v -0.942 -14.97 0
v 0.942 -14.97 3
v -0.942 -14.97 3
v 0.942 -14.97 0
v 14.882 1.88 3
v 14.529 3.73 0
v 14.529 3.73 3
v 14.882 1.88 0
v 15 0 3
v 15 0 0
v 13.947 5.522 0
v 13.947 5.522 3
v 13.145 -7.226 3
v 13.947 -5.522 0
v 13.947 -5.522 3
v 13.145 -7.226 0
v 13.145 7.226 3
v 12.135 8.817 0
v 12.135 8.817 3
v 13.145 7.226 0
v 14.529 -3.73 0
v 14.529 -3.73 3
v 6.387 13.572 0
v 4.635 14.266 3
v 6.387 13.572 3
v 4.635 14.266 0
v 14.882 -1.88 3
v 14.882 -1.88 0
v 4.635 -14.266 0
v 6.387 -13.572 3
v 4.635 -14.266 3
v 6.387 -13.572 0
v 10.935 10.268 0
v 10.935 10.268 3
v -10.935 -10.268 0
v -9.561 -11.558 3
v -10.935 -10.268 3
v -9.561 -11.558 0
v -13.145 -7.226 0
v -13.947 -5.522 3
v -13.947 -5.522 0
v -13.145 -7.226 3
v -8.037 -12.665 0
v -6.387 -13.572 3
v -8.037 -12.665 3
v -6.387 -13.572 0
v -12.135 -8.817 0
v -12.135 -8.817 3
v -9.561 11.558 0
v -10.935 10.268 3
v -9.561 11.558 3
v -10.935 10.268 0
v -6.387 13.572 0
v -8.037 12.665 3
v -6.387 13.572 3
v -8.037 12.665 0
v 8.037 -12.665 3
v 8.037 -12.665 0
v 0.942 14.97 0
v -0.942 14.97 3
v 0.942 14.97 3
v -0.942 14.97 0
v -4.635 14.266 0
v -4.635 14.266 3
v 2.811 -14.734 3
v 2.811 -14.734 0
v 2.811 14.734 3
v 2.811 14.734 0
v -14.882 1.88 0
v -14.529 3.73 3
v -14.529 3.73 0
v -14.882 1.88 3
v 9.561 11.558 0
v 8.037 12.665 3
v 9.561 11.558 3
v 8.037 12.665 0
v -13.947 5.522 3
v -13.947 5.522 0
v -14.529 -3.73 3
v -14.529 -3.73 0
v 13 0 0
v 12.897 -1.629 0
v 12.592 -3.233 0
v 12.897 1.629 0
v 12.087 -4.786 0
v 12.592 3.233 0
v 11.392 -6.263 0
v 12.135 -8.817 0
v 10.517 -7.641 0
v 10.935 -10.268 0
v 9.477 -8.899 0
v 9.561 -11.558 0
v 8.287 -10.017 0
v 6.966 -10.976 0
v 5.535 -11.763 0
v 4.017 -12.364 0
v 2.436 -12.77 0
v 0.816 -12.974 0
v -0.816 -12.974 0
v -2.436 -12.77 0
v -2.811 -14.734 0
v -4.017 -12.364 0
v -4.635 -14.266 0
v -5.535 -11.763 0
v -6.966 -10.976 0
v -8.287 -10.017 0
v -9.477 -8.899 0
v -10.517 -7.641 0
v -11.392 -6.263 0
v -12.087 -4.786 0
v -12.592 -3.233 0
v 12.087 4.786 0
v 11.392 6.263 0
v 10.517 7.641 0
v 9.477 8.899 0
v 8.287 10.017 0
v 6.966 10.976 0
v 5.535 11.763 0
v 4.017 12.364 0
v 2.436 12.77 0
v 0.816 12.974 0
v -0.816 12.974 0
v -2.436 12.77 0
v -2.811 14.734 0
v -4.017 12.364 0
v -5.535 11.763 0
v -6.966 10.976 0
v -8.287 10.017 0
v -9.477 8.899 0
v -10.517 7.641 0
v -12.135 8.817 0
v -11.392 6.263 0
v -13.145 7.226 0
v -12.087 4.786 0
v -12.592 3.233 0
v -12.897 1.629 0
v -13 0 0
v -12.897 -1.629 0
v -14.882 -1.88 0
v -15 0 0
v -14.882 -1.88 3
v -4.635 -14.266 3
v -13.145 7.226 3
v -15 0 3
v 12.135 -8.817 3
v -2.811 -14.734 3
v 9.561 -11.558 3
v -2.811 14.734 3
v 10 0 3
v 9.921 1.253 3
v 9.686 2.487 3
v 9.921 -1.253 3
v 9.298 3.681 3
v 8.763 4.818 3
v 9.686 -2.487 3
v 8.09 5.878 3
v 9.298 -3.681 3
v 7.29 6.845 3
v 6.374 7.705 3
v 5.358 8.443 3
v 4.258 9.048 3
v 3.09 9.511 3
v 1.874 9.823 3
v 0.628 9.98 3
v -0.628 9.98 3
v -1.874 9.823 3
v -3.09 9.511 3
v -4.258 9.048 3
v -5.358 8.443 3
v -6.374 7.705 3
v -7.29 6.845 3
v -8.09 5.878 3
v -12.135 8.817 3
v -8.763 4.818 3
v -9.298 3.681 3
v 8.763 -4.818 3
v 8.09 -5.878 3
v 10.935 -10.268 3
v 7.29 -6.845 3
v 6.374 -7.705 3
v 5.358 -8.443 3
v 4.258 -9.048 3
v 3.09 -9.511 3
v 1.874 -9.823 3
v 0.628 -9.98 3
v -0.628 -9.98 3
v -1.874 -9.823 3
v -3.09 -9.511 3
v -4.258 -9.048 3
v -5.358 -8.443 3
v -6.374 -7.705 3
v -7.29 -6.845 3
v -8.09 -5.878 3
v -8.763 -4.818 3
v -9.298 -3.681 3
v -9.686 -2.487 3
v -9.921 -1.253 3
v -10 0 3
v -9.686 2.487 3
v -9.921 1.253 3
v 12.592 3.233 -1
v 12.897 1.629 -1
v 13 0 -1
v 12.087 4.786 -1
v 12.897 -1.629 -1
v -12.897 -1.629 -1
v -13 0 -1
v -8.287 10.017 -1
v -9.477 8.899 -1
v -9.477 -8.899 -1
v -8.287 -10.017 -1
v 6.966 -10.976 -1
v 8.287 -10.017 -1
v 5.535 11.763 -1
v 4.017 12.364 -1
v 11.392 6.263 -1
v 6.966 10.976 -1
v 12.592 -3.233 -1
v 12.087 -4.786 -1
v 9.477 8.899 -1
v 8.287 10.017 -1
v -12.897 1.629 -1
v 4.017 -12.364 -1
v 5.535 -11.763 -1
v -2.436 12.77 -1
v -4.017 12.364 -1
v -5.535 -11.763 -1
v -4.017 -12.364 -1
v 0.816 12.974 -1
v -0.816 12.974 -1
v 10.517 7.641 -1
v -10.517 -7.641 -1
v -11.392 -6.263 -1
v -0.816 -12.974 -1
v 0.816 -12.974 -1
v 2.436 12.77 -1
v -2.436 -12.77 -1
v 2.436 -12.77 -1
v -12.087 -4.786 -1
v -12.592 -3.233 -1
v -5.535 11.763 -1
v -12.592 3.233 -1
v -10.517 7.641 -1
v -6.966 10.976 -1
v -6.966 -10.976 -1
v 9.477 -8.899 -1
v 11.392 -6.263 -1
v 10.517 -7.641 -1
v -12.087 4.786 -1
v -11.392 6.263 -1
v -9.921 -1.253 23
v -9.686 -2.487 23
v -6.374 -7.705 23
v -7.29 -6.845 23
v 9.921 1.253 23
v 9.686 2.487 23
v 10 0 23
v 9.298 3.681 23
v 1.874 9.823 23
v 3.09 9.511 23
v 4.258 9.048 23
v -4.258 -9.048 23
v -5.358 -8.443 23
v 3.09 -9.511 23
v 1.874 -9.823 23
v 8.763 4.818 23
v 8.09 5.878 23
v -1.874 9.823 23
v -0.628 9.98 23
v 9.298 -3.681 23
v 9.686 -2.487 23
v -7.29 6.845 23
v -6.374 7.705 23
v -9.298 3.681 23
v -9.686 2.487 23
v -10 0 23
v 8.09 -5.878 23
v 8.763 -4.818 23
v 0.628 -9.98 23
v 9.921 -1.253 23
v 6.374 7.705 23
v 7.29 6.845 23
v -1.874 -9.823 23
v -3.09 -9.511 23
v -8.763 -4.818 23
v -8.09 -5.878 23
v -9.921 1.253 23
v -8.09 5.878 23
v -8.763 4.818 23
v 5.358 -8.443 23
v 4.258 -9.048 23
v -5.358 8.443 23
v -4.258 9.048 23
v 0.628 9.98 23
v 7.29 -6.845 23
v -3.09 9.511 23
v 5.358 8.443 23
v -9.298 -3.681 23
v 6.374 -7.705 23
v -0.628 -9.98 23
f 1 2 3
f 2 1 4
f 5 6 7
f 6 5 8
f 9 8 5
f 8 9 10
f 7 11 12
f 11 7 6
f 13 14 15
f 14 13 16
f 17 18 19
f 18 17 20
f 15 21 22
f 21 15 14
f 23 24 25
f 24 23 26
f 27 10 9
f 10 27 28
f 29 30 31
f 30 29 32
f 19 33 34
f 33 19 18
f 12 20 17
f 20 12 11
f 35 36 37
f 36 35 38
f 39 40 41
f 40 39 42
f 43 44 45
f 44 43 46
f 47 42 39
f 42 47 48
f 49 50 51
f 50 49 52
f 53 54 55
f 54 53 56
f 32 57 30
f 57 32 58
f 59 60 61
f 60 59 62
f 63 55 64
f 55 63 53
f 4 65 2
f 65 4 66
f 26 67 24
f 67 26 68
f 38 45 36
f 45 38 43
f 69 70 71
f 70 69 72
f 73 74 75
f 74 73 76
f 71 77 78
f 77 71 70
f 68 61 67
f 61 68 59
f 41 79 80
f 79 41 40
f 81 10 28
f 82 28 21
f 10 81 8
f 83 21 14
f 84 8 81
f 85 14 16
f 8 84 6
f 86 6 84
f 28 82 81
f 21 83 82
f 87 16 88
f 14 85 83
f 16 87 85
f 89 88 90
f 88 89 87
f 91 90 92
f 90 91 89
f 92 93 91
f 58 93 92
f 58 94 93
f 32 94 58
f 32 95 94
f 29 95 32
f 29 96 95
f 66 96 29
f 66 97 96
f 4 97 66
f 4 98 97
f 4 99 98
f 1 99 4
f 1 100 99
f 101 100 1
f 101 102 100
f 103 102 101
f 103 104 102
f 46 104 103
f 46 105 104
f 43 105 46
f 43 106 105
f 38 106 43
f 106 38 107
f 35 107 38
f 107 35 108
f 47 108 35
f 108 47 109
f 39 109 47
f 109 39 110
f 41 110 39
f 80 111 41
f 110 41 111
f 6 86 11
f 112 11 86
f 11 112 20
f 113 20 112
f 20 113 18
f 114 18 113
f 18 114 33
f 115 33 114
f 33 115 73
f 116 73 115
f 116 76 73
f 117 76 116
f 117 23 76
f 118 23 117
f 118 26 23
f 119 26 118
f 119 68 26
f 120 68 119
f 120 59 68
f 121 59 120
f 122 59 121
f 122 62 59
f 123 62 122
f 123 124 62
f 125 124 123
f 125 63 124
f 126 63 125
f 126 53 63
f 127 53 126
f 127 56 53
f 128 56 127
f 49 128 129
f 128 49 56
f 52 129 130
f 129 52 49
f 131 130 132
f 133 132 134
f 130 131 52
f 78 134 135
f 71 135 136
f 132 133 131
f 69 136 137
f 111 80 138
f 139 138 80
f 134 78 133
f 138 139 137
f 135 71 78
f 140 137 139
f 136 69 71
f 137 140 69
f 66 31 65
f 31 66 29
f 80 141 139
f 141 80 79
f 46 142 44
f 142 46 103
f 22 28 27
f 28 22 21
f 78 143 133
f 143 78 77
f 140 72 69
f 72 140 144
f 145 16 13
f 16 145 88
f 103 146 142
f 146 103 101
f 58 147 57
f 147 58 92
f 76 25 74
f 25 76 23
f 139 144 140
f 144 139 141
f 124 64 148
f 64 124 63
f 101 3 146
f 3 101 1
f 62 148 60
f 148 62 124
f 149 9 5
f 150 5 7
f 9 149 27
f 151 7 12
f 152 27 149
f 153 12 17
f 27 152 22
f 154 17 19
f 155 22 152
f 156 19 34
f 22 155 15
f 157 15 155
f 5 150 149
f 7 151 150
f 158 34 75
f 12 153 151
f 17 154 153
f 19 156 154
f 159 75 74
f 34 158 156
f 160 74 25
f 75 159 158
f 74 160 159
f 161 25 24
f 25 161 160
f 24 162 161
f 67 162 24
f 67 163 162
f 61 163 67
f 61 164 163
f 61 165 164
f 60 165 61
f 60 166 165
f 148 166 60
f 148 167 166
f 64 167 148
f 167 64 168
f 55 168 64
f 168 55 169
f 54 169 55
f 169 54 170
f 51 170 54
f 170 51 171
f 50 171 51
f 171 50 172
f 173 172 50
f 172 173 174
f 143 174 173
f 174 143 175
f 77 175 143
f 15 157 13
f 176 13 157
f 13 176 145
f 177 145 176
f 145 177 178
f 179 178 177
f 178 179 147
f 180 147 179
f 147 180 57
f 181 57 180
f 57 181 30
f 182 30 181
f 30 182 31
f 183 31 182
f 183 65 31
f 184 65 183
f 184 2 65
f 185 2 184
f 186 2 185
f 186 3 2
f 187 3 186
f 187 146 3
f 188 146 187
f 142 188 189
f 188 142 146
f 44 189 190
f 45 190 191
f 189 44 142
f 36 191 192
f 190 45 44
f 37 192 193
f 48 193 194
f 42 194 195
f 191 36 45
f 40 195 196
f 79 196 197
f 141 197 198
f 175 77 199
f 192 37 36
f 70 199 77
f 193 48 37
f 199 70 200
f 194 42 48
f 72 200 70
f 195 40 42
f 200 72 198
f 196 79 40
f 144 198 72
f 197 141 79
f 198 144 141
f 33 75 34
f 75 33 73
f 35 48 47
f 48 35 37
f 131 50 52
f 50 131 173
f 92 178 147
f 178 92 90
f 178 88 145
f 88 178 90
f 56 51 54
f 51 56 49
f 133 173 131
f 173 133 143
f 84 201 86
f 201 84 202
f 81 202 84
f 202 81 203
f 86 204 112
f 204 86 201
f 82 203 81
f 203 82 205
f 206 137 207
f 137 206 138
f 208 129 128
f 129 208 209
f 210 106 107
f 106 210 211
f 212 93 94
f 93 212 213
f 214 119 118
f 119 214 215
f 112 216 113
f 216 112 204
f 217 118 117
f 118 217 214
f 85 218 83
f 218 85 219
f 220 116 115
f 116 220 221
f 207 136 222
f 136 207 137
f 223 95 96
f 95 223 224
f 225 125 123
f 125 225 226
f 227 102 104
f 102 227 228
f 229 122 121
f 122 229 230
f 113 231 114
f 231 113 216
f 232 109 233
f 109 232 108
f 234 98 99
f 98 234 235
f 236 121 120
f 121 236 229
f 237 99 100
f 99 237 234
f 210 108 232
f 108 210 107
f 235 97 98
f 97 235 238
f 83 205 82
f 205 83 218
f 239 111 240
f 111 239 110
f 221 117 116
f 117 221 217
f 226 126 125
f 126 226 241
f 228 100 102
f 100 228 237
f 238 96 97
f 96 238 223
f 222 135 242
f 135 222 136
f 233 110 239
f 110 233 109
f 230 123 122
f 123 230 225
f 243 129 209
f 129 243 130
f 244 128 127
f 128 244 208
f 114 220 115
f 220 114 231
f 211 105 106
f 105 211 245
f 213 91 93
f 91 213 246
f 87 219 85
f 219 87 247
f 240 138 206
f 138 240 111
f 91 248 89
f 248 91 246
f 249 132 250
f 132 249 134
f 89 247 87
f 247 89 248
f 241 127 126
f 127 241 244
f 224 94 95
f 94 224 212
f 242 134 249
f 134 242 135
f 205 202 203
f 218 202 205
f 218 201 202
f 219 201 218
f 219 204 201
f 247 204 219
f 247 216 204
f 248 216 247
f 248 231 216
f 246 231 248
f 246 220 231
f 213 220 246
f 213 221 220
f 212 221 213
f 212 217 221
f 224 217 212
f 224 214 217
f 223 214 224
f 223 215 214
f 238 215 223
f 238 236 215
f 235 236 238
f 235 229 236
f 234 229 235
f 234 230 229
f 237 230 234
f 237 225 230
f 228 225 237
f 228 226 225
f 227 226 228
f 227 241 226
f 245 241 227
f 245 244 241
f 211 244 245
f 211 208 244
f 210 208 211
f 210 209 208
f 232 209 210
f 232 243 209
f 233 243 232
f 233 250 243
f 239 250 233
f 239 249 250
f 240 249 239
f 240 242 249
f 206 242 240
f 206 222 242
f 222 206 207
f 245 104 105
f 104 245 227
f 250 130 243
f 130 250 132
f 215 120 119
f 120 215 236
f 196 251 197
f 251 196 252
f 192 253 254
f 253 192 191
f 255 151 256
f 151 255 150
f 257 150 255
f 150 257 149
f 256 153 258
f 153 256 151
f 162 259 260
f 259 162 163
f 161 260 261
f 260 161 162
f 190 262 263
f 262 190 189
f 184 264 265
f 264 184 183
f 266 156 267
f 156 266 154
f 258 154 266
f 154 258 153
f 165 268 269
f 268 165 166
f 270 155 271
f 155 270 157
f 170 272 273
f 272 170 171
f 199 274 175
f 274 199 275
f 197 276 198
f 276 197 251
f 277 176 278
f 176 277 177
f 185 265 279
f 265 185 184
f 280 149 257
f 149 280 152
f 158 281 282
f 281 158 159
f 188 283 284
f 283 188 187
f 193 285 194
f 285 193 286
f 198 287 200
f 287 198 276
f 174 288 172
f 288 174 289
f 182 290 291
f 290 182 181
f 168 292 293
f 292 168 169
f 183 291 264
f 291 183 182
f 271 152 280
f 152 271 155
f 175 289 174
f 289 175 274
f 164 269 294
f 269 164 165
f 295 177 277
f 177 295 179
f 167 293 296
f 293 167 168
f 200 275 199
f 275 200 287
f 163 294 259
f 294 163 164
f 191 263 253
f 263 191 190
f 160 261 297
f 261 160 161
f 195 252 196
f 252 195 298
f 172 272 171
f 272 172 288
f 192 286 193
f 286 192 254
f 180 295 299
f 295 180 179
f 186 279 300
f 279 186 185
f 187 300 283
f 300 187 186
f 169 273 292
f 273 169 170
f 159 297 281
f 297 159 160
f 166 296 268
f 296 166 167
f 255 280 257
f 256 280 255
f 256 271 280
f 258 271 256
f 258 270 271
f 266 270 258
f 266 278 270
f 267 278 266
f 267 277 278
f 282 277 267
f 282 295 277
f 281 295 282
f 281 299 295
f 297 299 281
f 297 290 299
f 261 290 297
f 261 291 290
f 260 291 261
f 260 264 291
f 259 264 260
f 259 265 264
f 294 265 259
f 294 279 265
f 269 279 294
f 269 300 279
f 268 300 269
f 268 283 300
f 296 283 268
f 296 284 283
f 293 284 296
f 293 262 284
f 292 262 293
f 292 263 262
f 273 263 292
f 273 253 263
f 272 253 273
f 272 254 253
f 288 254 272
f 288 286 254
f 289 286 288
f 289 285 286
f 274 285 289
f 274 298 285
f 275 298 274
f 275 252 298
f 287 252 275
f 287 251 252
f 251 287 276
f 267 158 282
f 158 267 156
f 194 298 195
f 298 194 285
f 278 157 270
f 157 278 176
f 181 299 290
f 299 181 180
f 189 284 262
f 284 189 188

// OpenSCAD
// file: parametre.scad
/* pour le rendu openscad */

// pour la finesse de rendu
// plus c'est élevé, mieux c'est... mais ça prend plus de temps et de ressource
resolution = 50;

// pour enlever de la matière des objets dans openscad et être certain qu'il ne reste pas un bout de face
difference_objet_marge = 20;

// pour afficher (1) ou pas (0) les accessoires installés
show_accessoires = 1;



/* pour le design du jeu  */

// tout est en millimetre !!!!

// configuration globale
////////////////////////

// quand on perce et que l'on va insérer quelque chose dedans...
// il faut un peu de vide en plus ;)
padding_percage = 0.2;

// espace supplémentaire pour la largeur de rainure
padding_rainure = 1;

// profondeur standard pour une rainure
profondeur_rainure = 2; // moins que epaisseur_tole_grille_led et que epaisseur_tole_grille_led ! Il faut qu'il reste de la matière !

// définition de base du jeu
nombre_colonnes = 7;
nombre_lignes = 6;


// les boutons de sélection de colonne et du nombre de joueurs
//////////////////////////////////////////////////////////////
diametre_bouton_arcade = 30;
rayon_bouton_arcade = diametre_bouton_arcade / 2;
diametre_trou_bouton_arcade = 20; // TODO: à valider !
rayon_trou_bouton_arcade = diametre_trou_bouton_arcade / 2;
hauteur_bague_bouton_arcade = 3;
hauteur_bouton_arcade = 1;
diametre_push_bouton_arcade = diametre_bouton_arcade - 4;
profondeur_interne_bouton_arcade = 20; // TODO: à valider !


// bouton EC11
//////////////
diametre_bouton_ec11 = 14.4;
hauteur_bouton_ec11 = 13.1;
epaisseur_trait_ec11 = 1;
trou_axe_ec11 = 7;
espace_platine_bouton = 10.7;
hauteur_platine_ec11 = 33.4;
largeur_platine_ec11 = 27.5;
epaisseur_platine_ec11 = 1.3;
trou_fixation_ec11 = 3;
trou_marge_ec11 = 2.40;


// haut-parleur HP8R
////////////////////
HP8R_epaisseur_totale = 16.25;
HP8R_largeur = 36.24;
HP8R_hauteur = 75;
HP8R_epaisseur_tole = 1.63;
HP8R_hauteur_caisson = 71;
//HP8R_epaisseur_caisson = 16.25 - HP8R_epaisseur_tole;
HP8R_decalage_hauteur_trou = 12.3;
HP8R_largeur_trou = 27.1;
HP8R_hauteur_trou = 38.3;
HP8R_epaisseur_trou = HP8R_epaisseur_totale - 2;
HP8R_diametre_creuse_coins = 10;
HP8R_diametre_creuse_fixation = 3;
HP8R_marge_creuse_fixation = 1.6 + padding_percage;


// Embase alimentation
//////////////////////
embase_decallage = 3.3;
embase_externe_largeur = 8.95;
embase_externe_hauteur = 10.7;
embase_externe_profondeur = 3.5;
embase_externe_marge_trou = 3.3;
embase_externe_diametre_trou = 6.4;
embase_externe_diametre_pin = 1.6;
embase_interne_profondeur = 10.6;
embase_platine_profondeur = 25.5;
embase_platine_decallage = 5.6;
embase_platine_largeur = 25.9;
embase_platine_epaisseur = 1.6;
embase_marge_fixation = 1.5;
embase_diametre_fixation = 3;


// led type1 : LED étanche avec électronique carré
////////////
profondeur_chapeau_led = 7.5;
diametre_trou_led = 7.9; // TODO: à valider !
diametre_interne_led = 13;
profondeur_interne_led = 7;
boitier_largeur_led = 22.5;
boitier_hauteur_led = 18.5;
boitier_epaisseur_led = 8;




// cadrillage autour des LEDs
/////////////////////////////
profondeur_separateur_led = 15; // TODO: à valider !


// pour stocker les cables et l'électronique
////////////////////////////////////////////
espace_vide_milieu = 50; // TODO: à valider !   40 => conflit entre bouton et led en haut !!!


// le mur Star Wars fenetré
///////////////////////////
epaisseur_tole_mur = 2;
taille_fenetre = diametre_bouton_arcade; // valeur à fixer si bouton plus petit, ici je m'adapte à cette taille de bouton
ecart_entre_fenetre = 5; // au jugé ;)
marge_mur = 15; // pour aérer le tour   10 => haut parleur touche led et conflit bouton dans le coin !

// on peut maintenant calculer la surface du jeu !
largeur_mur = marge_mur + (nombre_colonnes * taille_fenetre) + ((nombre_colonnes - 1) * ecart_entre_fenetre) + marge_mur;
hauteur_mur = marge_mur + (nombre_lignes * taille_fenetre) + ((nombre_lignes - 1) * ecart_entre_fenetre) + marge_mur;
echo(str("** PLAQUE MUR (x2) : ", largeur_mur , " x ", hauteur_mur, " x ", epaisseur_tole_mur));


// la grille de LEDS
////////////////////
epaisseur_tole_grille_led = 3;
largeur_rainure_grille_led = epaisseur_tole_grille_led + padding_rainure;
profondeur_rainure_grille_led = profondeur_rainure; // moins que epaisseur_tole_grille_led !!!
echo(str("** PLAQUE GRILLE LED (x2) : ", largeur_mur , " x ", hauteur_mur, " x ", epaisseur_tole_grille_led));


// le plexi blanc derrière le mur, pour faire les fenêtres
//////////////////////////////////////////////////////////
epaisseur_plexi_blanc = 2;
transparence_plexi = 1;
echo(str("** PLAQUE PLEXI BLANC (x2) : ", largeur_mur , " x ", hauteur_mur, " x ", epaisseur_plexi_blanc));


// calcul de l'épaisseur complète du jeu
epaisseur_jeu = espace_vide_milieu + 2 * epaisseur_tole_mur + 2 * epaisseur_plexi_blanc + 2 * epaisseur_tole_grille_led + 2 * profondeur_separateur_led;


// la plaque du dessus avec les boutons de choix de colonne
///////////////////////////////////////////////////////////
epaisseur_tole_dessus = 4; // ce "chapeau" sera rainurée pour tenir les plaques !
debord_rainure = 5; // qui dépasse de devant et derrière 
profondeur_dessus = epaisseur_jeu + 2 * debord_rainure;
marge_largeur_dessus = (largeur_mur - (nombre_colonnes * diametre_bouton_arcade) - ((nombre_colonnes - 1) * ecart_entre_fenetre)) / 2;
largeur_rainure_mur_plexi = epaisseur_tole_mur + epaisseur_plexi_blanc + padding_rainure;
profondeur_rainure_mur_plexi = profondeur_rainure; // moins que epaisseur_tole_dessus !!!
echo(str("** PLAQUE DESSUS : ", largeur_mur , " x ", profondeur_dessus, " x ", epaisseur_tole_dessus));


// la plaque de dessous
///////////////////////
epaisseur_tole_dessous = 4; // ce socle sera rainurée pour tenir les plaques !
dessous_debord_rainure = 50;
profondeur_dessous = epaisseur_jeu + 2 * dessous_debord_rainure;
echo(str("** PLAQUE SOCLE : ", largeur_mur , " x ", profondeur_dessous, " x ", epaisseur_tole_dessous));


hauteur_cote = epaisseur_tole_dessous + hauteur_mur + epaisseur_tole_dessus - 2 * profondeur_rainure_grille_led;
largeur_cote = profondeur_dessus;

// côté gauche
//////////////
epaisseur_tole_gauche = 2;
echo(str("** PLAQUE COTE GAUCHE : ", largeur_cote , " x ", hauteur_cote, " x ", epaisseur_tole_gauche));


// côté droit
/////////////
epaisseur_tole_droit = 2;
position_ec11 = epaisseur_tole_dessous + embase_platine_epaisseur + embase_externe_hauteur + 15 + hauteur_platine_ec11 / 2; // 15 = taille d'une pinouille arduino connectée sur l'embase
echo(str("** PLAQUE COTE DROIT : ", largeur_cote , " x ", hauteur_cote, " x ", epaisseur_tole_droit));

position_haut_parleur_HP8R = position_ec11 + hauteur_platine_ec11 / 2 + 5;
// main file
include <parametre.scad>

bouton_arcade();

module bouton_arcade() {
	union() {
		cylinder(hauteur_bague_bouton_arcade, d=diametre_bouton_arcade, $fn=resolution);
		translate([0, 0, -hauteur_bouton_arcade])
			cylinder(hauteur_bouton_arcade, d=diametre_push_bouton_arcade, $fn=resolution);
		translate([0, 0, hauteur_bague_bouton_arcade])
			cylinder(profondeur_interne_bouton_arcade, d=diametre_trou_bouton_arcade, $fn=resolution);
	}
}

module trou_bouton_arcade(epaisseur) {
	translate([0, 0, -difference_objet_marge / 2])
		cylinder(epaisseur + difference_objet_marge, d=diametre_trou_bouton_arcade + padding_percage, $fn=resolution);
}
